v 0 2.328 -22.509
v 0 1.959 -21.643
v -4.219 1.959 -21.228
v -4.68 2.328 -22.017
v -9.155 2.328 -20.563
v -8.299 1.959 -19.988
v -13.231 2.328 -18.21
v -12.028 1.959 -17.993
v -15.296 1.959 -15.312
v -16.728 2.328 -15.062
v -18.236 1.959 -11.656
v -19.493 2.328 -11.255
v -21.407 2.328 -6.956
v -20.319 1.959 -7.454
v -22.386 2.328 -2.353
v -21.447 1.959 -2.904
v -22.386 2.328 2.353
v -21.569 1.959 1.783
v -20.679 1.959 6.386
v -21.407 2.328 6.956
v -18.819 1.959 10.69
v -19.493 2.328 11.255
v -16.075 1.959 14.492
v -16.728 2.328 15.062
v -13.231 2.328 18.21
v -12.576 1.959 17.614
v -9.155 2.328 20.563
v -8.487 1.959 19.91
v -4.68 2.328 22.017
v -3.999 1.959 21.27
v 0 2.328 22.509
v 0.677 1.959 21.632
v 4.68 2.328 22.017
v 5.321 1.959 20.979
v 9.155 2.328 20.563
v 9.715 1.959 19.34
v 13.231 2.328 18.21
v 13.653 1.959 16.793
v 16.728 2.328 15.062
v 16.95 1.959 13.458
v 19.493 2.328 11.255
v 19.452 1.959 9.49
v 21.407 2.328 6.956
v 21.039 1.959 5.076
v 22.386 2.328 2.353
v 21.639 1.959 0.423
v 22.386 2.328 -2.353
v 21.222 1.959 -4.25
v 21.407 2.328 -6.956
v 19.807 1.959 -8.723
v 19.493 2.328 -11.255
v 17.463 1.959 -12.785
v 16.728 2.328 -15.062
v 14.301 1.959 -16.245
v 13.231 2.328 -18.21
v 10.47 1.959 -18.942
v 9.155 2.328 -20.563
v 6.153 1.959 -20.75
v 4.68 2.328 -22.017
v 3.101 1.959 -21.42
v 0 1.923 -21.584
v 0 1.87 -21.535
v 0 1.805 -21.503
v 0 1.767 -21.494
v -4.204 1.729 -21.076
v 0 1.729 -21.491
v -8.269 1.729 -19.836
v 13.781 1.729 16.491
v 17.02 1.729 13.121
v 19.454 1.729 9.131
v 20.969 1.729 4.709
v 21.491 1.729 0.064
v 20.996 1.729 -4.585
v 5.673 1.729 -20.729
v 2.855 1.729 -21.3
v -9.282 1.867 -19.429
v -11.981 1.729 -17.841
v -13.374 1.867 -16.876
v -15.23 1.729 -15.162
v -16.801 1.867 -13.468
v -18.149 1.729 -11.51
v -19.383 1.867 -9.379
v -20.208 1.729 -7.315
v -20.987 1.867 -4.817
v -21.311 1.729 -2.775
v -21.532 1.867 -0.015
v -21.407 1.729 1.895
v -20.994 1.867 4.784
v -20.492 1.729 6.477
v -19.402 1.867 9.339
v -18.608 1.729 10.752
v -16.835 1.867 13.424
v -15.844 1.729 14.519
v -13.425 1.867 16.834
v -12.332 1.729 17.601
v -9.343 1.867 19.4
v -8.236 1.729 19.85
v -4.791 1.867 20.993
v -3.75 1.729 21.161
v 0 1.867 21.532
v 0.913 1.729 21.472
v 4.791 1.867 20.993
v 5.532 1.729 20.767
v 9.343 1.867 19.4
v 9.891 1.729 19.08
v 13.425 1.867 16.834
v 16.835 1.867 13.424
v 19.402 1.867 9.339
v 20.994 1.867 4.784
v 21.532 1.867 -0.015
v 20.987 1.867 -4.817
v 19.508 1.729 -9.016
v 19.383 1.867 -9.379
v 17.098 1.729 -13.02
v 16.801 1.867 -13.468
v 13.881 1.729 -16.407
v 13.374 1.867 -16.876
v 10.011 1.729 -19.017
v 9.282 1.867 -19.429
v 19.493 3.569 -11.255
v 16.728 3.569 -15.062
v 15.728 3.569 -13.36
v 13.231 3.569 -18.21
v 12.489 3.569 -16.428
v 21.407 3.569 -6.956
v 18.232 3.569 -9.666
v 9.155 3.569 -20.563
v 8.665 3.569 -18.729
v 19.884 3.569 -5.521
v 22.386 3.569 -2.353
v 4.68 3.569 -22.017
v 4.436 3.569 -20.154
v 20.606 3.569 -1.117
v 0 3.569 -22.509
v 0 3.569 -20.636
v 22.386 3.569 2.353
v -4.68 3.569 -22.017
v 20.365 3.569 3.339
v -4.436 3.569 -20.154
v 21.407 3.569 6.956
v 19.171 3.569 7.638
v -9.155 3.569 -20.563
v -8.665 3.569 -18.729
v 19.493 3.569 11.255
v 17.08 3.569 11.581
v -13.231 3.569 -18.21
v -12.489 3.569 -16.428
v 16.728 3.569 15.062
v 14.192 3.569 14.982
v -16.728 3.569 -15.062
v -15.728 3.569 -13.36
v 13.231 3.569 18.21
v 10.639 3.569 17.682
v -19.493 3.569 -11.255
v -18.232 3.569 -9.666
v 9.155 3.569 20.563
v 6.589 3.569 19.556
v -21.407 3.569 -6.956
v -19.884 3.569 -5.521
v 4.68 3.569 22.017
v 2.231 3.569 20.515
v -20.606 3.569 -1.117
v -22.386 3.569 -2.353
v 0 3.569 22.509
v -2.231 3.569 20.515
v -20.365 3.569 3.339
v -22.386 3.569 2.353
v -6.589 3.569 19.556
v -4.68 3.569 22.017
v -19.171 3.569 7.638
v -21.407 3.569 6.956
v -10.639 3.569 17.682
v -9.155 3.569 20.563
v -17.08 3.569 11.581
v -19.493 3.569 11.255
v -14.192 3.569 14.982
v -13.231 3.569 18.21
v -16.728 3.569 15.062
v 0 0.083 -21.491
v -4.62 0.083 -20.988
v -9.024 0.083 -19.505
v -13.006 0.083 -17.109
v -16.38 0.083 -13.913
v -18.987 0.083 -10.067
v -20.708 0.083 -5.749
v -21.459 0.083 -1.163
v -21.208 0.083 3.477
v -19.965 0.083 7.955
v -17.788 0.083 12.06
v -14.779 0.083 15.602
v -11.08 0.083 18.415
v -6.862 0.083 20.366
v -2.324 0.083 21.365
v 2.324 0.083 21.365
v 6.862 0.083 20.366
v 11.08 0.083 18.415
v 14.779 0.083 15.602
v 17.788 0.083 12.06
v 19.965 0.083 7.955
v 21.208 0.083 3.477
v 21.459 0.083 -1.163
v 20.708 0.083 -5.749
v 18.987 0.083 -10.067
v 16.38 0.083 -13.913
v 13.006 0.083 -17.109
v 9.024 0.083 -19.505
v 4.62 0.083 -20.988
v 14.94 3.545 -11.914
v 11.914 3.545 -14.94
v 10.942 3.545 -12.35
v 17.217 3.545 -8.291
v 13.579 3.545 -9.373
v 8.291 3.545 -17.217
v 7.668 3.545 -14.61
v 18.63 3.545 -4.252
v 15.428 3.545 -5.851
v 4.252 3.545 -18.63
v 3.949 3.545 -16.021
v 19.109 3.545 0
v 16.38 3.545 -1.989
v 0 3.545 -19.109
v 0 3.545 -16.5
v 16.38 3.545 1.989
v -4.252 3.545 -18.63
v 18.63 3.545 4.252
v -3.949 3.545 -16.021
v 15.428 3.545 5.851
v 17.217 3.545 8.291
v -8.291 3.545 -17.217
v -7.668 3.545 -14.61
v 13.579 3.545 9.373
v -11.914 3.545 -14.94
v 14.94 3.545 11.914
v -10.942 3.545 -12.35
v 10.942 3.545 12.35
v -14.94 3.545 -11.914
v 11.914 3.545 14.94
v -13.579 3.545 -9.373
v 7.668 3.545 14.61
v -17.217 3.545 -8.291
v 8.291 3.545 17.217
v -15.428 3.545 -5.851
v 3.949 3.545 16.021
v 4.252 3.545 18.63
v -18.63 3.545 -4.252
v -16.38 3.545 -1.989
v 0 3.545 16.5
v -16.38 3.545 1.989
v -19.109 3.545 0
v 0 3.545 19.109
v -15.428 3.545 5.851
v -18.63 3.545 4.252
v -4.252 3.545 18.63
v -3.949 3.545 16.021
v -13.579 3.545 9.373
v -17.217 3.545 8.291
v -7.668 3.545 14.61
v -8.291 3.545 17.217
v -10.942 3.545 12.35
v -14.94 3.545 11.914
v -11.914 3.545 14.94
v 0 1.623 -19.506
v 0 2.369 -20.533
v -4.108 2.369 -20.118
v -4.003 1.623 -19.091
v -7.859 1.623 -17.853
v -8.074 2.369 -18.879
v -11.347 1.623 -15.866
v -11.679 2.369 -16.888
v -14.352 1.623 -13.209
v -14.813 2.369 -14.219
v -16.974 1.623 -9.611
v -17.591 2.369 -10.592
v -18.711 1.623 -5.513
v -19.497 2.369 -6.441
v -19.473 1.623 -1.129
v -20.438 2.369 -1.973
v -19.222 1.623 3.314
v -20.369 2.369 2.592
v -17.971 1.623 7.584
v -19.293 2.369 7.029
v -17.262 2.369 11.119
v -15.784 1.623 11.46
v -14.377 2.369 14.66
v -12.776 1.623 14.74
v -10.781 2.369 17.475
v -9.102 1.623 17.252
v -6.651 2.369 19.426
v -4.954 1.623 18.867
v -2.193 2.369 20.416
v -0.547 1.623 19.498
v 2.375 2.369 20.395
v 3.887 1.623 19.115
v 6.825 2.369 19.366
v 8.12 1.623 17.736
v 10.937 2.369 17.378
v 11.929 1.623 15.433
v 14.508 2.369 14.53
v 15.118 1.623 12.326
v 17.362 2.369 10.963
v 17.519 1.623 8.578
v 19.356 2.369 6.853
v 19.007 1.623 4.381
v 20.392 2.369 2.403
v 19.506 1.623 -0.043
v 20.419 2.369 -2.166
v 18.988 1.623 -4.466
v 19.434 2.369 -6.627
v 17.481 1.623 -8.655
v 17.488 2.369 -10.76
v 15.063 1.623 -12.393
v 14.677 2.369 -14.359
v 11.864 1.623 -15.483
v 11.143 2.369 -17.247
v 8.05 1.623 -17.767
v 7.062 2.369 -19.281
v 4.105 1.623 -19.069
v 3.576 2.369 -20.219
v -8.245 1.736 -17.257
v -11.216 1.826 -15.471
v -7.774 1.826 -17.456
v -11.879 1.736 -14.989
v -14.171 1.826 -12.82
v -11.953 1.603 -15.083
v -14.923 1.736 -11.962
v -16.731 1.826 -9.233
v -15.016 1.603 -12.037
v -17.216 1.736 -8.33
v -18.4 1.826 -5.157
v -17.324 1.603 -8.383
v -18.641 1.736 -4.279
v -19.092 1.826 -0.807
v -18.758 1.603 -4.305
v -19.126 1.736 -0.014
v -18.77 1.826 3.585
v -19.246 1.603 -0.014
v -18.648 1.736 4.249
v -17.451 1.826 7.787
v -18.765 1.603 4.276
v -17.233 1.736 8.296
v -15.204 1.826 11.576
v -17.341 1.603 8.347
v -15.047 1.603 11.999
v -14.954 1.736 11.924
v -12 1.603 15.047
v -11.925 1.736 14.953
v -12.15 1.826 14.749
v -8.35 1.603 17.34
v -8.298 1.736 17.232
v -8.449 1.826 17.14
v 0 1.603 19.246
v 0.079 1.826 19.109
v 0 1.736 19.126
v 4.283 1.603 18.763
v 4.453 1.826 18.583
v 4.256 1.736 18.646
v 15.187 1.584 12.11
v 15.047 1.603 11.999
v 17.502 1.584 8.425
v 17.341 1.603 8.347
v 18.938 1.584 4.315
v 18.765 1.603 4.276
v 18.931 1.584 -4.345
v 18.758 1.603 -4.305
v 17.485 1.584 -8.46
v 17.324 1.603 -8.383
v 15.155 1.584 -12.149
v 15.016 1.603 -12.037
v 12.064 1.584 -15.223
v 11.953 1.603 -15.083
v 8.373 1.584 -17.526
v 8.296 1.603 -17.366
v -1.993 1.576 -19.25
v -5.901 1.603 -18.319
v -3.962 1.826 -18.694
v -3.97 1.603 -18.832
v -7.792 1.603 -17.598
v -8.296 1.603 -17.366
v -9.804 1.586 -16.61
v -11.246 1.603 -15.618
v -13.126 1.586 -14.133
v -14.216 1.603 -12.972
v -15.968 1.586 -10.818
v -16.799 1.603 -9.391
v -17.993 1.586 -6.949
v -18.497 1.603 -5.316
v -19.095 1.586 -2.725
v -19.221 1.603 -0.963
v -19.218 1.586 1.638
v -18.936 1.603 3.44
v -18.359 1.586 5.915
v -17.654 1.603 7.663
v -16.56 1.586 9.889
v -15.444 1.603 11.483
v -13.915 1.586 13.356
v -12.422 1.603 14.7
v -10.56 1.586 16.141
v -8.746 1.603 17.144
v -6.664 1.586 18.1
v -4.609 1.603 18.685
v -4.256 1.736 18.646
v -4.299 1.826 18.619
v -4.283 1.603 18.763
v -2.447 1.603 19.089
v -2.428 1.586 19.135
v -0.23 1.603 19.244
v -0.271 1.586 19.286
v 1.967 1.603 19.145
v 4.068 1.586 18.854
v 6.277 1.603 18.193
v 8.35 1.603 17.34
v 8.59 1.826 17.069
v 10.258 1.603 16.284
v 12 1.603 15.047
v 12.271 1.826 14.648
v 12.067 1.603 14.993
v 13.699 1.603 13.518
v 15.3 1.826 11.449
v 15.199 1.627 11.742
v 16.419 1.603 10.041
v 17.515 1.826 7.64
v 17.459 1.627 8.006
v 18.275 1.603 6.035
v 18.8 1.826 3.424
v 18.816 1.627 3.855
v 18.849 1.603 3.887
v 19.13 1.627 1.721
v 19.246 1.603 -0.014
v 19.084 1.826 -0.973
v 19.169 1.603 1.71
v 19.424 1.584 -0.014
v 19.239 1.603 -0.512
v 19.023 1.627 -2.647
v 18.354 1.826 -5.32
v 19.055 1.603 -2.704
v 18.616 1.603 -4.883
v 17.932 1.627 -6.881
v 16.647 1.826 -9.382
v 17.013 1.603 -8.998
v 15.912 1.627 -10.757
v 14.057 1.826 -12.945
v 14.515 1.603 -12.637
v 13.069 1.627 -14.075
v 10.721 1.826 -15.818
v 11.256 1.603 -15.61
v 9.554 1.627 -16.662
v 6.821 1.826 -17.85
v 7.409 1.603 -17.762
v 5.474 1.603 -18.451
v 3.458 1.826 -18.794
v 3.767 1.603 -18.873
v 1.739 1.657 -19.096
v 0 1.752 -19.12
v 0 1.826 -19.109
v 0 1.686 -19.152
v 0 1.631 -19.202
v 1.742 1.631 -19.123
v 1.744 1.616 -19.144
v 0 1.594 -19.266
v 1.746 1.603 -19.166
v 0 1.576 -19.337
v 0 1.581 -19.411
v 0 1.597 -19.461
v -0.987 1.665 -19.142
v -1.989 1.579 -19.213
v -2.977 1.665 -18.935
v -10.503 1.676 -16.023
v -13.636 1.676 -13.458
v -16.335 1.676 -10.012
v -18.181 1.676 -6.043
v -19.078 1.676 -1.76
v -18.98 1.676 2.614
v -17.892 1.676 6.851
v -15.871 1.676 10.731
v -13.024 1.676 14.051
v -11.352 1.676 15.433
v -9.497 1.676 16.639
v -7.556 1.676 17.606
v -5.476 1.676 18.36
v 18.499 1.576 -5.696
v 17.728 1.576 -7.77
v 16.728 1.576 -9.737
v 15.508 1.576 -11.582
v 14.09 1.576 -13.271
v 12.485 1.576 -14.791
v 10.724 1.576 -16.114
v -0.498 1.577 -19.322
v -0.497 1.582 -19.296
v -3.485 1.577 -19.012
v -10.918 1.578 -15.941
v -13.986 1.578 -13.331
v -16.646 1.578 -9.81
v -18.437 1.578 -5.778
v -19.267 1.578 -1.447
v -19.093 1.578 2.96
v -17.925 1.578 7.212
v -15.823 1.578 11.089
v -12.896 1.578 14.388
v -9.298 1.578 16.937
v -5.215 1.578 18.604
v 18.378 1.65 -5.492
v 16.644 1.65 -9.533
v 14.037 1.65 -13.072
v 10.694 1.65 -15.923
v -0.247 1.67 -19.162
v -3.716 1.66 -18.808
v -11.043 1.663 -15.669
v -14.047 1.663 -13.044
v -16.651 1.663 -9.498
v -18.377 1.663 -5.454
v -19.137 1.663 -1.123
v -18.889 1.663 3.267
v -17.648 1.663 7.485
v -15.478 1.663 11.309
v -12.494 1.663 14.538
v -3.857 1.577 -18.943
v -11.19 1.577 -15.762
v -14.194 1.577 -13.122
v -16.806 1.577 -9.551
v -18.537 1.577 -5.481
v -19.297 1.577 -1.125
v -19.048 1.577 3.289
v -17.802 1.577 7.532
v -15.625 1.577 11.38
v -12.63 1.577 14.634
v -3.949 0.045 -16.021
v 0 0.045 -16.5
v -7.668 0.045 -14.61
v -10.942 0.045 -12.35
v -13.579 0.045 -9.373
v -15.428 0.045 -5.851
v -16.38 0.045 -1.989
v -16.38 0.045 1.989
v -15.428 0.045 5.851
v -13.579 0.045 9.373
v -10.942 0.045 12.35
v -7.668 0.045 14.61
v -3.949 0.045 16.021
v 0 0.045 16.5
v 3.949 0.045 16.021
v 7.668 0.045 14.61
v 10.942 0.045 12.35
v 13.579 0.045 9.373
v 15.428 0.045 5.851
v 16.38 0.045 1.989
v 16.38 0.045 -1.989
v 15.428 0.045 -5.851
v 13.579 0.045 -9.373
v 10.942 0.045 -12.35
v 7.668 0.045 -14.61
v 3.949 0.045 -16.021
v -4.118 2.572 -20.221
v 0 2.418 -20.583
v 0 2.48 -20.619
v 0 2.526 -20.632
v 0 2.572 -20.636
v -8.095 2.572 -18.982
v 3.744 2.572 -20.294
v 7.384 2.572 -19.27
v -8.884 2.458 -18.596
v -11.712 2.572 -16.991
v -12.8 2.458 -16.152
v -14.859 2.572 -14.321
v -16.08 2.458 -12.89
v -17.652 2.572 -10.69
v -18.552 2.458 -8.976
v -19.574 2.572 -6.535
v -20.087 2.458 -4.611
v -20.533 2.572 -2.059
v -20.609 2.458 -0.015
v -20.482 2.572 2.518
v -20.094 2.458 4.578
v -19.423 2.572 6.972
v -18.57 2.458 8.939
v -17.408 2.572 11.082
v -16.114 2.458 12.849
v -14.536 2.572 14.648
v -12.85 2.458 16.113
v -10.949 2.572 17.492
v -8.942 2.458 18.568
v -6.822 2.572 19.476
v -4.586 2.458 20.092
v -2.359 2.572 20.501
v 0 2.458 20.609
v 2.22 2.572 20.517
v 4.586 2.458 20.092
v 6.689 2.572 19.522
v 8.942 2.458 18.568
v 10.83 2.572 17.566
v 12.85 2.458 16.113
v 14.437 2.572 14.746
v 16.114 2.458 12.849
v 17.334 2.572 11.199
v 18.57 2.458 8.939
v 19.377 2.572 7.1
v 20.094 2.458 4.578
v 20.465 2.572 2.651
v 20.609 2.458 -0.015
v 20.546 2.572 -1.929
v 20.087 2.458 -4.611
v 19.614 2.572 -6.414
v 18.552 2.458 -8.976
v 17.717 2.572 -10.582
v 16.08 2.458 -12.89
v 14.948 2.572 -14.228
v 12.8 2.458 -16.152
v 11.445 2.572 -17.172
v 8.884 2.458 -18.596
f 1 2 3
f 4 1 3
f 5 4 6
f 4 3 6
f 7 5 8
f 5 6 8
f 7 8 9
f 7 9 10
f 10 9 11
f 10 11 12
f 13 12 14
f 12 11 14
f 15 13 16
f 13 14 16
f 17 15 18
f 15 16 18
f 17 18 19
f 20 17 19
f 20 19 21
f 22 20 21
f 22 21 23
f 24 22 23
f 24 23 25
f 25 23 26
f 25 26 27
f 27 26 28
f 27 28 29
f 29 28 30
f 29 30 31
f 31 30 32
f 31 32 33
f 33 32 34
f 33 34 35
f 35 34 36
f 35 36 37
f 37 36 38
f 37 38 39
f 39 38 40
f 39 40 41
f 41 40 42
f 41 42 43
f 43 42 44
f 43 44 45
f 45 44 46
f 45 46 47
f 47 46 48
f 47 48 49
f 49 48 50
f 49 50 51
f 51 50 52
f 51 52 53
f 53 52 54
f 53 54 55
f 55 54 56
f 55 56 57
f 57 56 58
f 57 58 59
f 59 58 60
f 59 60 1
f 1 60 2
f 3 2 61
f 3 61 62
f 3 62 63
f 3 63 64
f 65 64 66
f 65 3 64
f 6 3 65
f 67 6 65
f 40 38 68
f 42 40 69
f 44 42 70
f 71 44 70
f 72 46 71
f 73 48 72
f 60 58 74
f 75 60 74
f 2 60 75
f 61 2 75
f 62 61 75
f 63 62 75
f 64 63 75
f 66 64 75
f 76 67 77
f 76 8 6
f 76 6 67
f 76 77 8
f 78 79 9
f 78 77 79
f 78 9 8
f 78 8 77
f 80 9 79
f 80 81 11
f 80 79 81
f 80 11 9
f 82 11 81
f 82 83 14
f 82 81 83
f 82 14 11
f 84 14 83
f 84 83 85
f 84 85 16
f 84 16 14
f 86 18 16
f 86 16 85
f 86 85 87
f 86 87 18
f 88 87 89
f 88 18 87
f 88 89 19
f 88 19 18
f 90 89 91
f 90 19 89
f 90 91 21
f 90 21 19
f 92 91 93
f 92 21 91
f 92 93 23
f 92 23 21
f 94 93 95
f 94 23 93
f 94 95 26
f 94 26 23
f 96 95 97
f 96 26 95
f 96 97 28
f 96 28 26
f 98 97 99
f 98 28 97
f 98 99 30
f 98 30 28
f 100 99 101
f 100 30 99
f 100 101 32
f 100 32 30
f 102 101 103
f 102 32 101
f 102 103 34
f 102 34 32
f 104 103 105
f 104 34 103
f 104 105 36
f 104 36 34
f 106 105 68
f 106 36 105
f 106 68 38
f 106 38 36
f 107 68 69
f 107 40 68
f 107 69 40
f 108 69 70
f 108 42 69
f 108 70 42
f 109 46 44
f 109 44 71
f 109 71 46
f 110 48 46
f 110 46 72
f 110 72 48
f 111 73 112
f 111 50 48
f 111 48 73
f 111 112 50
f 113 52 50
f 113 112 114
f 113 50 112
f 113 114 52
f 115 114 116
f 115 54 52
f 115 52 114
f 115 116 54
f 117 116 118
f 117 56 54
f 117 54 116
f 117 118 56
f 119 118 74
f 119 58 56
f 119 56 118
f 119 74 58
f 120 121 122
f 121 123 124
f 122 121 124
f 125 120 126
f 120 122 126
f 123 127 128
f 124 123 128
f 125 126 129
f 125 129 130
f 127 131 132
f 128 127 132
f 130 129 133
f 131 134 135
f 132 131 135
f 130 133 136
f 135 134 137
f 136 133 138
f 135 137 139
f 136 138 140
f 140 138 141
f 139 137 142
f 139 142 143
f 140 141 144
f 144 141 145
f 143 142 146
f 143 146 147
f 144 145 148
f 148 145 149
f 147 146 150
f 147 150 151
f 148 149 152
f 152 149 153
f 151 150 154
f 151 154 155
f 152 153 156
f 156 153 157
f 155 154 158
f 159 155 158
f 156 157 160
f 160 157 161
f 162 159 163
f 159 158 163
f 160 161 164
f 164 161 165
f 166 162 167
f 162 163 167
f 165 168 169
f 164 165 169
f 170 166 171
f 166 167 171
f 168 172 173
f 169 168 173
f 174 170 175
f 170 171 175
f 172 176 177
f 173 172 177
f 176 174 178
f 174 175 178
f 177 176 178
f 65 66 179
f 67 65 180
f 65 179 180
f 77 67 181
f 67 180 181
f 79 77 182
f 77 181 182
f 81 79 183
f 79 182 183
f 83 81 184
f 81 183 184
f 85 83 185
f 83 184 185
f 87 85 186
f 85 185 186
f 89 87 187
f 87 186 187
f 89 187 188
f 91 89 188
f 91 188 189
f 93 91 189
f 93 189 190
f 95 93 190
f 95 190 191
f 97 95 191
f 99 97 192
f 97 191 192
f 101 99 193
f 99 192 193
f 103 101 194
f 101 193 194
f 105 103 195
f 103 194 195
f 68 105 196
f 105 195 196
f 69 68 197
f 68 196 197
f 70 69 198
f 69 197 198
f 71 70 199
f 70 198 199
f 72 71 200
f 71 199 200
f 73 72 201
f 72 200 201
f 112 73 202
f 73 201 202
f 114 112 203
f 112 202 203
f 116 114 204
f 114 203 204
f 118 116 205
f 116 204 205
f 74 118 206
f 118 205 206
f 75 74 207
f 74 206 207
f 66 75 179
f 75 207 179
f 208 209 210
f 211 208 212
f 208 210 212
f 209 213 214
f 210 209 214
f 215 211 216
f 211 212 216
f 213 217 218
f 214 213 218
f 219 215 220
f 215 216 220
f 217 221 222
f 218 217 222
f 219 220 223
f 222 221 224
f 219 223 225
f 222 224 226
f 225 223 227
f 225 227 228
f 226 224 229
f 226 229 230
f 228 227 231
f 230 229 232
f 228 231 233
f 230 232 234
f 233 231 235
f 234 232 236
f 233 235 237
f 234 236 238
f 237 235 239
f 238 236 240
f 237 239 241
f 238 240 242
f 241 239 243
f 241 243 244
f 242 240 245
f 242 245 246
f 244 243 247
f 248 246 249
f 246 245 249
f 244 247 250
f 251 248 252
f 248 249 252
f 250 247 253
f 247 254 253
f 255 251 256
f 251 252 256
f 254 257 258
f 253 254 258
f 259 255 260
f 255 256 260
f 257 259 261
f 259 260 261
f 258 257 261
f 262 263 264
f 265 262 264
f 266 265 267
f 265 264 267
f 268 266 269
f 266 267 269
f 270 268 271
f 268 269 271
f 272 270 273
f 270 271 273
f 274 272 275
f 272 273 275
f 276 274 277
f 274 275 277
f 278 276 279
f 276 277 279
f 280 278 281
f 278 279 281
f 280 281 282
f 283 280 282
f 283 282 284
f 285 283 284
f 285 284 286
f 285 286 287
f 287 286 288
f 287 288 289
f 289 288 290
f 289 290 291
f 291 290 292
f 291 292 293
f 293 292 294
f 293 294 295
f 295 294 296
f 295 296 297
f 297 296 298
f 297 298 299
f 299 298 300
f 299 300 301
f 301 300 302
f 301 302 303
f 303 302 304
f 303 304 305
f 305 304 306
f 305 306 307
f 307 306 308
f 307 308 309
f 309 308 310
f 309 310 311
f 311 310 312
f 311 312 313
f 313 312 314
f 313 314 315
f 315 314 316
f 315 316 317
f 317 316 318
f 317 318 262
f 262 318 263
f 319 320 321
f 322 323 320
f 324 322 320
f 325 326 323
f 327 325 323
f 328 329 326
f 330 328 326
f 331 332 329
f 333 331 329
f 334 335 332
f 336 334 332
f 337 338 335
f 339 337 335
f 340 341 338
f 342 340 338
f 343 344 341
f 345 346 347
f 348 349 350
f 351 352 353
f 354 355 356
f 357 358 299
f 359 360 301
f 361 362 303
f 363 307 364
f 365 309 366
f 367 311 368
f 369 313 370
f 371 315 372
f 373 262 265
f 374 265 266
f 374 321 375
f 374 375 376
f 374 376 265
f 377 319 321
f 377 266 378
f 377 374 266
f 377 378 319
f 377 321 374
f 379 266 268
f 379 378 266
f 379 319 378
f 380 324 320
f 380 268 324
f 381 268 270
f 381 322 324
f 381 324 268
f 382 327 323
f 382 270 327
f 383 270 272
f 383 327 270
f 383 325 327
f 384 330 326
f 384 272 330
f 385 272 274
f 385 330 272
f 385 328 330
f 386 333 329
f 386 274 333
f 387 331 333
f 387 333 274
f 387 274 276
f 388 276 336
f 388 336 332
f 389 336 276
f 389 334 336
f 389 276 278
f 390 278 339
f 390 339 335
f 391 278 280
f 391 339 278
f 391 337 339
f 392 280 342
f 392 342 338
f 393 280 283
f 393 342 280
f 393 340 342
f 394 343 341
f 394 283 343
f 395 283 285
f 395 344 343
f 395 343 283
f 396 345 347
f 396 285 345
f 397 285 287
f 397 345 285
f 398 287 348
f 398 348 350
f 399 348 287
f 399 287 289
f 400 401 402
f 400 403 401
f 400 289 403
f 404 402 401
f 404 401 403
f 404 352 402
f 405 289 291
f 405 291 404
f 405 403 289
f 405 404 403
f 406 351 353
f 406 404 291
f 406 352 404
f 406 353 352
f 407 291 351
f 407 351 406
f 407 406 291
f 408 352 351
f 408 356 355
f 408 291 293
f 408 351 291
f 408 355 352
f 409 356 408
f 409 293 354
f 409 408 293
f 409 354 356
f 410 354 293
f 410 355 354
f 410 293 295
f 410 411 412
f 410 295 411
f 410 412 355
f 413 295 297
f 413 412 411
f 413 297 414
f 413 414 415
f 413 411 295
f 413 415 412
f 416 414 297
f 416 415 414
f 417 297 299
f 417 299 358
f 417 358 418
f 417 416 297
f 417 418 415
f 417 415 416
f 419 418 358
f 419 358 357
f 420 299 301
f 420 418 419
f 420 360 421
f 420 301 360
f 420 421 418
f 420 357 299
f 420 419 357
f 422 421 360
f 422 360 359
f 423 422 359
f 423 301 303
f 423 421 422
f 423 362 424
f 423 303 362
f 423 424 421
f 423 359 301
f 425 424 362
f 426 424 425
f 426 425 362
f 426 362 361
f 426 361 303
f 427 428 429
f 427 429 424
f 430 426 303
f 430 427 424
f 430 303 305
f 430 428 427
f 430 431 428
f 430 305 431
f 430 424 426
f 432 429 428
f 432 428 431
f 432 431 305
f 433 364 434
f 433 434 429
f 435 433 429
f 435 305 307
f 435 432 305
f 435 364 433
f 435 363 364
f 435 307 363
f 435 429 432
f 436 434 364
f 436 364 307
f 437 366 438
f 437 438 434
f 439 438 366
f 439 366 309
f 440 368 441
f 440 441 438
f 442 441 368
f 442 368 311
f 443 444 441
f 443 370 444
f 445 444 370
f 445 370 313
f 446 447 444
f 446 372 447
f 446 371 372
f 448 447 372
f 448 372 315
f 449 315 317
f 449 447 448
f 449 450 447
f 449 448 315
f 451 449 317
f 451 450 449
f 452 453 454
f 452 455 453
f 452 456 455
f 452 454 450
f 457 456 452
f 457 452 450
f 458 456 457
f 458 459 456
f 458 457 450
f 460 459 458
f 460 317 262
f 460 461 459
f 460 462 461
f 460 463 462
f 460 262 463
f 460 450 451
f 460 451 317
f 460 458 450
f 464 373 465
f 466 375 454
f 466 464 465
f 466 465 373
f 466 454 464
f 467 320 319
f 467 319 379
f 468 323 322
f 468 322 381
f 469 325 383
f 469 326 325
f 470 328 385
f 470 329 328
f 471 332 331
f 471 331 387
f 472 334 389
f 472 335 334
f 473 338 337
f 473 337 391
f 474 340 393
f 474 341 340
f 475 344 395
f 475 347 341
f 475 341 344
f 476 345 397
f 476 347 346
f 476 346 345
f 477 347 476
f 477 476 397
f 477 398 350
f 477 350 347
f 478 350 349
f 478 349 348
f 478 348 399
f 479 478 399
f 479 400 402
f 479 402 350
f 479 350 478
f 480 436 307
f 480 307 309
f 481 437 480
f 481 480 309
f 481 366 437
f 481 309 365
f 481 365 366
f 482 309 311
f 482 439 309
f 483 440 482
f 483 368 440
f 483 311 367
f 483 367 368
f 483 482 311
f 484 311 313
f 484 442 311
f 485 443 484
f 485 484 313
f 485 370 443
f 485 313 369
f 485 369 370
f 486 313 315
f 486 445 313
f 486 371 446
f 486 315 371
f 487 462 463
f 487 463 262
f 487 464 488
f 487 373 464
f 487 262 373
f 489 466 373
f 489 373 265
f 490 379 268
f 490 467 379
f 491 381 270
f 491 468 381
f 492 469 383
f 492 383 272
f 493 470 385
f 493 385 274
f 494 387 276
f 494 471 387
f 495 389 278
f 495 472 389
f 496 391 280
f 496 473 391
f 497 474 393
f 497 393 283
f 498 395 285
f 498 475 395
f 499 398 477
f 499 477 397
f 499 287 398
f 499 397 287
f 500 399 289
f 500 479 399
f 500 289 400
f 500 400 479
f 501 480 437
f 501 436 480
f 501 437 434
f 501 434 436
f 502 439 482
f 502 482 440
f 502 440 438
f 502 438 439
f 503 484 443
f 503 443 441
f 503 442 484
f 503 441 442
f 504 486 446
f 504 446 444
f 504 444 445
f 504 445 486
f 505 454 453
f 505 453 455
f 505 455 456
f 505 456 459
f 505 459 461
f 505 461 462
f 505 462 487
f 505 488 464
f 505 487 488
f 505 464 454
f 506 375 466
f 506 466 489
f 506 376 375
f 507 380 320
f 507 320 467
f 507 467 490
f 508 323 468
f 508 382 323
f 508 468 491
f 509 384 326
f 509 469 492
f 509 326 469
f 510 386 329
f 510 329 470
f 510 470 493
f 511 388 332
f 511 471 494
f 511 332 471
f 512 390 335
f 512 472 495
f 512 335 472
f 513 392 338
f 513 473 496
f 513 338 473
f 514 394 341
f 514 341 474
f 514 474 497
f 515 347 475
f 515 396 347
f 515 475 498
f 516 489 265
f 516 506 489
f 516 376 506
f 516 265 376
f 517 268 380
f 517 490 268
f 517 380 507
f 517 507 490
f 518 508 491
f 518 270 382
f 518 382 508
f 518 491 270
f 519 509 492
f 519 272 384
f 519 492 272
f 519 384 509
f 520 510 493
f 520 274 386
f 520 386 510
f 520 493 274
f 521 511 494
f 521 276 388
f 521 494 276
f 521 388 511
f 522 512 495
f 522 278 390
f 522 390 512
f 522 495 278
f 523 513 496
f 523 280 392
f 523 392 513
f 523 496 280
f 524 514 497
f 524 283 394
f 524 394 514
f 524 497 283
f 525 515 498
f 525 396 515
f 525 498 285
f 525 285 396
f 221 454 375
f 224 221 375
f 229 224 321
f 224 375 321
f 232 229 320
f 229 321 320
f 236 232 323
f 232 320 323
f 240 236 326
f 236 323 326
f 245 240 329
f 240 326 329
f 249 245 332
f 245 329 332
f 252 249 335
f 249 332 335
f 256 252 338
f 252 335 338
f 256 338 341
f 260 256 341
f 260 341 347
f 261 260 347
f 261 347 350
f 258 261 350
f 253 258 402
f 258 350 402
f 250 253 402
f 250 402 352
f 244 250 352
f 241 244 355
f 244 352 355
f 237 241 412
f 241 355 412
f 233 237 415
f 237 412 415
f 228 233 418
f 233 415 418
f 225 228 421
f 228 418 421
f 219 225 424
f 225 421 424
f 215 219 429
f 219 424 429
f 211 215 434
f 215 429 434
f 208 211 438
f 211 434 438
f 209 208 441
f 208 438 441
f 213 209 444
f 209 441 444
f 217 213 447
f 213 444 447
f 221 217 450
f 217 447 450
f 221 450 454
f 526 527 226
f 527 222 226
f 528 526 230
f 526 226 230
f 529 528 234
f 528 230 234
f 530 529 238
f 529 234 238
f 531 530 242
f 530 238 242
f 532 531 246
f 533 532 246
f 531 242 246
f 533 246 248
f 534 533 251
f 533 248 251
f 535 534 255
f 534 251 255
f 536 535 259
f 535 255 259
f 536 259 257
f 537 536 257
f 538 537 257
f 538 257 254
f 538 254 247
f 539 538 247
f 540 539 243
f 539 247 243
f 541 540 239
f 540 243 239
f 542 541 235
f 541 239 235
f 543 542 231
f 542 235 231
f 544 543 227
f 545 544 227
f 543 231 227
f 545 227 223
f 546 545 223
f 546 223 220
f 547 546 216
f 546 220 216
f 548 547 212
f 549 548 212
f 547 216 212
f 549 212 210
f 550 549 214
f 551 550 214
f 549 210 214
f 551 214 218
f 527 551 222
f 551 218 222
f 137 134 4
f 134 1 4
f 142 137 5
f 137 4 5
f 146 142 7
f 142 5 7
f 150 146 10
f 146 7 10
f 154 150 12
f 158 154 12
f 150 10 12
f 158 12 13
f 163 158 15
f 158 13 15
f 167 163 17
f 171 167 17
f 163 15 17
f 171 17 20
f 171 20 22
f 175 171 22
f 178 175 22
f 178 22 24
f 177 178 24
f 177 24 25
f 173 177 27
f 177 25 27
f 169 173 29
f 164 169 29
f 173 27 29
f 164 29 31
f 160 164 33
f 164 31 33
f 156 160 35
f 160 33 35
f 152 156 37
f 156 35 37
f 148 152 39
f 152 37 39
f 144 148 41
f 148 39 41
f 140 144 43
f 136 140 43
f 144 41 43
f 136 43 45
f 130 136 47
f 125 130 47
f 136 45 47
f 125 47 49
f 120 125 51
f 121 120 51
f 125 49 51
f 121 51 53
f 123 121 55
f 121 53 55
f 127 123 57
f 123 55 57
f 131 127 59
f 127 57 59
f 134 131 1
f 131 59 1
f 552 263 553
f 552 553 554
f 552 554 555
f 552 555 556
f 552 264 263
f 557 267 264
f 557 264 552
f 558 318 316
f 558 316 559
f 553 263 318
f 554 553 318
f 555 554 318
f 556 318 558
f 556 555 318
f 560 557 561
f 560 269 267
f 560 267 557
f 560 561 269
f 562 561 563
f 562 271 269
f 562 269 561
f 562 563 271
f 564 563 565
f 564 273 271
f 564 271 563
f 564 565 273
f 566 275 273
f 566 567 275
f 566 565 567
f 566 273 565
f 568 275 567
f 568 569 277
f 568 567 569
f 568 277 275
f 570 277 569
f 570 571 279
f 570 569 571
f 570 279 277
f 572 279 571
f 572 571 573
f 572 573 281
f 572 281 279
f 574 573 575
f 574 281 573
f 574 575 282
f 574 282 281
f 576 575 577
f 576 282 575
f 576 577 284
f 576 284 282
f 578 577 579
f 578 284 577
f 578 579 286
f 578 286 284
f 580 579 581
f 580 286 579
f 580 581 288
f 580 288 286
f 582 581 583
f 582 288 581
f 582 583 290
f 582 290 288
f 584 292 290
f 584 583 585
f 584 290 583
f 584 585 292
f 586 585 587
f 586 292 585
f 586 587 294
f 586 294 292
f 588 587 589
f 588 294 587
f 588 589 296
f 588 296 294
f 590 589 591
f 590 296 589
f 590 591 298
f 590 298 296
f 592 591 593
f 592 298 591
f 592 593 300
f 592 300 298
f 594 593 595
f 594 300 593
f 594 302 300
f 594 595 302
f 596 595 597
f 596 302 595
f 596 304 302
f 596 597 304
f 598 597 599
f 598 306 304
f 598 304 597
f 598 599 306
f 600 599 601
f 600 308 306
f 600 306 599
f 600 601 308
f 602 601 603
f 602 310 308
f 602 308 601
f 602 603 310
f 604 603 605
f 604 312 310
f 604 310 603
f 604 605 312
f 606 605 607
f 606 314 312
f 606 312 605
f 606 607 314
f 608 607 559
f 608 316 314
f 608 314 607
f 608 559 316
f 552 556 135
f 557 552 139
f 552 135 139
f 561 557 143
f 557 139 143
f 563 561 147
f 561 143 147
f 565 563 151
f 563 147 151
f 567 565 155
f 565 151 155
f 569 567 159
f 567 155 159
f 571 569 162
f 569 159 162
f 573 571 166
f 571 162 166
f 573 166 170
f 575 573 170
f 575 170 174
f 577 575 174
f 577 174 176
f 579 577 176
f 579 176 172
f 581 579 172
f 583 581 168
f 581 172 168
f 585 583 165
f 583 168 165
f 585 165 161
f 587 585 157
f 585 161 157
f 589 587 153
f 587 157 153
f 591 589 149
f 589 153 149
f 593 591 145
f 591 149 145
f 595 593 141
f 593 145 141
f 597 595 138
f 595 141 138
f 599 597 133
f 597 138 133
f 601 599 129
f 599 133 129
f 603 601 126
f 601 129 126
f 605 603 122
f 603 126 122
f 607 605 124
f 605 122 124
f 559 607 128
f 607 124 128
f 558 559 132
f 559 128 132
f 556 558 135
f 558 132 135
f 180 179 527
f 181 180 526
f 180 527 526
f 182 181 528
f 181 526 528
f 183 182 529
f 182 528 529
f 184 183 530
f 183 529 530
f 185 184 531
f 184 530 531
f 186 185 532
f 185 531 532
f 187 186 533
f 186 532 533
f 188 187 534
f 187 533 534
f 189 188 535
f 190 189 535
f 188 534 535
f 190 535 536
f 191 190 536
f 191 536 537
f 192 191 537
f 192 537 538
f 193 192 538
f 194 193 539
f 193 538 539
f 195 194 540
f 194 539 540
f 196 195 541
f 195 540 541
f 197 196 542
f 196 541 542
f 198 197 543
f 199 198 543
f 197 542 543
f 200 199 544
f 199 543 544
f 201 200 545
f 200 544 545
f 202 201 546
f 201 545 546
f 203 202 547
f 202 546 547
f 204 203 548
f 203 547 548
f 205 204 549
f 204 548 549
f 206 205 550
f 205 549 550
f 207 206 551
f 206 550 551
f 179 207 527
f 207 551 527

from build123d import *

# Parameters (mm, degrees)
REDONDEO1_R = 0.25


with BuildPart() as part:
    # Sketch1 → Revolución1 (revolve)
    with BuildSketch(Plane.XY, mode=Mode.PRIVATE) as revoluci_n1_sk:
        Polygon((-16.5, 0.045477085), (-16.5, 3.545477085), (-19.109062089, 3.545477085), (-19.109062089, 1.335016365), (-20.636358847, 2.444124724), (-20.636358847, 3.568650883), (-22.509115585, 3.568650883), (-22.509115585, 2.32755411), (-21.490917747, 1.893956842), (-21.490917747, 0.082983284), align=None)
    revolve(revoluci_n1_sk.sketch.rotate(Axis((0, -2.529637584, 0), (0, 1, 0)), 270), axis=Axis((0, -2.529637584, 0), (0, 1, 0)))

    # Redondeo1
    redondeo1_edges = [part.edges().sort_by_distance(p)[0] for p in [
        (0, 1.335016365, 19.109062089),
        (0, 2.444124724, 20.636358847),
        (0, 1.893956842, 21.490917747),
    ]]
    fillet(redondeo1_edges, radius=REDONDEO1_R)


solid = part.part
